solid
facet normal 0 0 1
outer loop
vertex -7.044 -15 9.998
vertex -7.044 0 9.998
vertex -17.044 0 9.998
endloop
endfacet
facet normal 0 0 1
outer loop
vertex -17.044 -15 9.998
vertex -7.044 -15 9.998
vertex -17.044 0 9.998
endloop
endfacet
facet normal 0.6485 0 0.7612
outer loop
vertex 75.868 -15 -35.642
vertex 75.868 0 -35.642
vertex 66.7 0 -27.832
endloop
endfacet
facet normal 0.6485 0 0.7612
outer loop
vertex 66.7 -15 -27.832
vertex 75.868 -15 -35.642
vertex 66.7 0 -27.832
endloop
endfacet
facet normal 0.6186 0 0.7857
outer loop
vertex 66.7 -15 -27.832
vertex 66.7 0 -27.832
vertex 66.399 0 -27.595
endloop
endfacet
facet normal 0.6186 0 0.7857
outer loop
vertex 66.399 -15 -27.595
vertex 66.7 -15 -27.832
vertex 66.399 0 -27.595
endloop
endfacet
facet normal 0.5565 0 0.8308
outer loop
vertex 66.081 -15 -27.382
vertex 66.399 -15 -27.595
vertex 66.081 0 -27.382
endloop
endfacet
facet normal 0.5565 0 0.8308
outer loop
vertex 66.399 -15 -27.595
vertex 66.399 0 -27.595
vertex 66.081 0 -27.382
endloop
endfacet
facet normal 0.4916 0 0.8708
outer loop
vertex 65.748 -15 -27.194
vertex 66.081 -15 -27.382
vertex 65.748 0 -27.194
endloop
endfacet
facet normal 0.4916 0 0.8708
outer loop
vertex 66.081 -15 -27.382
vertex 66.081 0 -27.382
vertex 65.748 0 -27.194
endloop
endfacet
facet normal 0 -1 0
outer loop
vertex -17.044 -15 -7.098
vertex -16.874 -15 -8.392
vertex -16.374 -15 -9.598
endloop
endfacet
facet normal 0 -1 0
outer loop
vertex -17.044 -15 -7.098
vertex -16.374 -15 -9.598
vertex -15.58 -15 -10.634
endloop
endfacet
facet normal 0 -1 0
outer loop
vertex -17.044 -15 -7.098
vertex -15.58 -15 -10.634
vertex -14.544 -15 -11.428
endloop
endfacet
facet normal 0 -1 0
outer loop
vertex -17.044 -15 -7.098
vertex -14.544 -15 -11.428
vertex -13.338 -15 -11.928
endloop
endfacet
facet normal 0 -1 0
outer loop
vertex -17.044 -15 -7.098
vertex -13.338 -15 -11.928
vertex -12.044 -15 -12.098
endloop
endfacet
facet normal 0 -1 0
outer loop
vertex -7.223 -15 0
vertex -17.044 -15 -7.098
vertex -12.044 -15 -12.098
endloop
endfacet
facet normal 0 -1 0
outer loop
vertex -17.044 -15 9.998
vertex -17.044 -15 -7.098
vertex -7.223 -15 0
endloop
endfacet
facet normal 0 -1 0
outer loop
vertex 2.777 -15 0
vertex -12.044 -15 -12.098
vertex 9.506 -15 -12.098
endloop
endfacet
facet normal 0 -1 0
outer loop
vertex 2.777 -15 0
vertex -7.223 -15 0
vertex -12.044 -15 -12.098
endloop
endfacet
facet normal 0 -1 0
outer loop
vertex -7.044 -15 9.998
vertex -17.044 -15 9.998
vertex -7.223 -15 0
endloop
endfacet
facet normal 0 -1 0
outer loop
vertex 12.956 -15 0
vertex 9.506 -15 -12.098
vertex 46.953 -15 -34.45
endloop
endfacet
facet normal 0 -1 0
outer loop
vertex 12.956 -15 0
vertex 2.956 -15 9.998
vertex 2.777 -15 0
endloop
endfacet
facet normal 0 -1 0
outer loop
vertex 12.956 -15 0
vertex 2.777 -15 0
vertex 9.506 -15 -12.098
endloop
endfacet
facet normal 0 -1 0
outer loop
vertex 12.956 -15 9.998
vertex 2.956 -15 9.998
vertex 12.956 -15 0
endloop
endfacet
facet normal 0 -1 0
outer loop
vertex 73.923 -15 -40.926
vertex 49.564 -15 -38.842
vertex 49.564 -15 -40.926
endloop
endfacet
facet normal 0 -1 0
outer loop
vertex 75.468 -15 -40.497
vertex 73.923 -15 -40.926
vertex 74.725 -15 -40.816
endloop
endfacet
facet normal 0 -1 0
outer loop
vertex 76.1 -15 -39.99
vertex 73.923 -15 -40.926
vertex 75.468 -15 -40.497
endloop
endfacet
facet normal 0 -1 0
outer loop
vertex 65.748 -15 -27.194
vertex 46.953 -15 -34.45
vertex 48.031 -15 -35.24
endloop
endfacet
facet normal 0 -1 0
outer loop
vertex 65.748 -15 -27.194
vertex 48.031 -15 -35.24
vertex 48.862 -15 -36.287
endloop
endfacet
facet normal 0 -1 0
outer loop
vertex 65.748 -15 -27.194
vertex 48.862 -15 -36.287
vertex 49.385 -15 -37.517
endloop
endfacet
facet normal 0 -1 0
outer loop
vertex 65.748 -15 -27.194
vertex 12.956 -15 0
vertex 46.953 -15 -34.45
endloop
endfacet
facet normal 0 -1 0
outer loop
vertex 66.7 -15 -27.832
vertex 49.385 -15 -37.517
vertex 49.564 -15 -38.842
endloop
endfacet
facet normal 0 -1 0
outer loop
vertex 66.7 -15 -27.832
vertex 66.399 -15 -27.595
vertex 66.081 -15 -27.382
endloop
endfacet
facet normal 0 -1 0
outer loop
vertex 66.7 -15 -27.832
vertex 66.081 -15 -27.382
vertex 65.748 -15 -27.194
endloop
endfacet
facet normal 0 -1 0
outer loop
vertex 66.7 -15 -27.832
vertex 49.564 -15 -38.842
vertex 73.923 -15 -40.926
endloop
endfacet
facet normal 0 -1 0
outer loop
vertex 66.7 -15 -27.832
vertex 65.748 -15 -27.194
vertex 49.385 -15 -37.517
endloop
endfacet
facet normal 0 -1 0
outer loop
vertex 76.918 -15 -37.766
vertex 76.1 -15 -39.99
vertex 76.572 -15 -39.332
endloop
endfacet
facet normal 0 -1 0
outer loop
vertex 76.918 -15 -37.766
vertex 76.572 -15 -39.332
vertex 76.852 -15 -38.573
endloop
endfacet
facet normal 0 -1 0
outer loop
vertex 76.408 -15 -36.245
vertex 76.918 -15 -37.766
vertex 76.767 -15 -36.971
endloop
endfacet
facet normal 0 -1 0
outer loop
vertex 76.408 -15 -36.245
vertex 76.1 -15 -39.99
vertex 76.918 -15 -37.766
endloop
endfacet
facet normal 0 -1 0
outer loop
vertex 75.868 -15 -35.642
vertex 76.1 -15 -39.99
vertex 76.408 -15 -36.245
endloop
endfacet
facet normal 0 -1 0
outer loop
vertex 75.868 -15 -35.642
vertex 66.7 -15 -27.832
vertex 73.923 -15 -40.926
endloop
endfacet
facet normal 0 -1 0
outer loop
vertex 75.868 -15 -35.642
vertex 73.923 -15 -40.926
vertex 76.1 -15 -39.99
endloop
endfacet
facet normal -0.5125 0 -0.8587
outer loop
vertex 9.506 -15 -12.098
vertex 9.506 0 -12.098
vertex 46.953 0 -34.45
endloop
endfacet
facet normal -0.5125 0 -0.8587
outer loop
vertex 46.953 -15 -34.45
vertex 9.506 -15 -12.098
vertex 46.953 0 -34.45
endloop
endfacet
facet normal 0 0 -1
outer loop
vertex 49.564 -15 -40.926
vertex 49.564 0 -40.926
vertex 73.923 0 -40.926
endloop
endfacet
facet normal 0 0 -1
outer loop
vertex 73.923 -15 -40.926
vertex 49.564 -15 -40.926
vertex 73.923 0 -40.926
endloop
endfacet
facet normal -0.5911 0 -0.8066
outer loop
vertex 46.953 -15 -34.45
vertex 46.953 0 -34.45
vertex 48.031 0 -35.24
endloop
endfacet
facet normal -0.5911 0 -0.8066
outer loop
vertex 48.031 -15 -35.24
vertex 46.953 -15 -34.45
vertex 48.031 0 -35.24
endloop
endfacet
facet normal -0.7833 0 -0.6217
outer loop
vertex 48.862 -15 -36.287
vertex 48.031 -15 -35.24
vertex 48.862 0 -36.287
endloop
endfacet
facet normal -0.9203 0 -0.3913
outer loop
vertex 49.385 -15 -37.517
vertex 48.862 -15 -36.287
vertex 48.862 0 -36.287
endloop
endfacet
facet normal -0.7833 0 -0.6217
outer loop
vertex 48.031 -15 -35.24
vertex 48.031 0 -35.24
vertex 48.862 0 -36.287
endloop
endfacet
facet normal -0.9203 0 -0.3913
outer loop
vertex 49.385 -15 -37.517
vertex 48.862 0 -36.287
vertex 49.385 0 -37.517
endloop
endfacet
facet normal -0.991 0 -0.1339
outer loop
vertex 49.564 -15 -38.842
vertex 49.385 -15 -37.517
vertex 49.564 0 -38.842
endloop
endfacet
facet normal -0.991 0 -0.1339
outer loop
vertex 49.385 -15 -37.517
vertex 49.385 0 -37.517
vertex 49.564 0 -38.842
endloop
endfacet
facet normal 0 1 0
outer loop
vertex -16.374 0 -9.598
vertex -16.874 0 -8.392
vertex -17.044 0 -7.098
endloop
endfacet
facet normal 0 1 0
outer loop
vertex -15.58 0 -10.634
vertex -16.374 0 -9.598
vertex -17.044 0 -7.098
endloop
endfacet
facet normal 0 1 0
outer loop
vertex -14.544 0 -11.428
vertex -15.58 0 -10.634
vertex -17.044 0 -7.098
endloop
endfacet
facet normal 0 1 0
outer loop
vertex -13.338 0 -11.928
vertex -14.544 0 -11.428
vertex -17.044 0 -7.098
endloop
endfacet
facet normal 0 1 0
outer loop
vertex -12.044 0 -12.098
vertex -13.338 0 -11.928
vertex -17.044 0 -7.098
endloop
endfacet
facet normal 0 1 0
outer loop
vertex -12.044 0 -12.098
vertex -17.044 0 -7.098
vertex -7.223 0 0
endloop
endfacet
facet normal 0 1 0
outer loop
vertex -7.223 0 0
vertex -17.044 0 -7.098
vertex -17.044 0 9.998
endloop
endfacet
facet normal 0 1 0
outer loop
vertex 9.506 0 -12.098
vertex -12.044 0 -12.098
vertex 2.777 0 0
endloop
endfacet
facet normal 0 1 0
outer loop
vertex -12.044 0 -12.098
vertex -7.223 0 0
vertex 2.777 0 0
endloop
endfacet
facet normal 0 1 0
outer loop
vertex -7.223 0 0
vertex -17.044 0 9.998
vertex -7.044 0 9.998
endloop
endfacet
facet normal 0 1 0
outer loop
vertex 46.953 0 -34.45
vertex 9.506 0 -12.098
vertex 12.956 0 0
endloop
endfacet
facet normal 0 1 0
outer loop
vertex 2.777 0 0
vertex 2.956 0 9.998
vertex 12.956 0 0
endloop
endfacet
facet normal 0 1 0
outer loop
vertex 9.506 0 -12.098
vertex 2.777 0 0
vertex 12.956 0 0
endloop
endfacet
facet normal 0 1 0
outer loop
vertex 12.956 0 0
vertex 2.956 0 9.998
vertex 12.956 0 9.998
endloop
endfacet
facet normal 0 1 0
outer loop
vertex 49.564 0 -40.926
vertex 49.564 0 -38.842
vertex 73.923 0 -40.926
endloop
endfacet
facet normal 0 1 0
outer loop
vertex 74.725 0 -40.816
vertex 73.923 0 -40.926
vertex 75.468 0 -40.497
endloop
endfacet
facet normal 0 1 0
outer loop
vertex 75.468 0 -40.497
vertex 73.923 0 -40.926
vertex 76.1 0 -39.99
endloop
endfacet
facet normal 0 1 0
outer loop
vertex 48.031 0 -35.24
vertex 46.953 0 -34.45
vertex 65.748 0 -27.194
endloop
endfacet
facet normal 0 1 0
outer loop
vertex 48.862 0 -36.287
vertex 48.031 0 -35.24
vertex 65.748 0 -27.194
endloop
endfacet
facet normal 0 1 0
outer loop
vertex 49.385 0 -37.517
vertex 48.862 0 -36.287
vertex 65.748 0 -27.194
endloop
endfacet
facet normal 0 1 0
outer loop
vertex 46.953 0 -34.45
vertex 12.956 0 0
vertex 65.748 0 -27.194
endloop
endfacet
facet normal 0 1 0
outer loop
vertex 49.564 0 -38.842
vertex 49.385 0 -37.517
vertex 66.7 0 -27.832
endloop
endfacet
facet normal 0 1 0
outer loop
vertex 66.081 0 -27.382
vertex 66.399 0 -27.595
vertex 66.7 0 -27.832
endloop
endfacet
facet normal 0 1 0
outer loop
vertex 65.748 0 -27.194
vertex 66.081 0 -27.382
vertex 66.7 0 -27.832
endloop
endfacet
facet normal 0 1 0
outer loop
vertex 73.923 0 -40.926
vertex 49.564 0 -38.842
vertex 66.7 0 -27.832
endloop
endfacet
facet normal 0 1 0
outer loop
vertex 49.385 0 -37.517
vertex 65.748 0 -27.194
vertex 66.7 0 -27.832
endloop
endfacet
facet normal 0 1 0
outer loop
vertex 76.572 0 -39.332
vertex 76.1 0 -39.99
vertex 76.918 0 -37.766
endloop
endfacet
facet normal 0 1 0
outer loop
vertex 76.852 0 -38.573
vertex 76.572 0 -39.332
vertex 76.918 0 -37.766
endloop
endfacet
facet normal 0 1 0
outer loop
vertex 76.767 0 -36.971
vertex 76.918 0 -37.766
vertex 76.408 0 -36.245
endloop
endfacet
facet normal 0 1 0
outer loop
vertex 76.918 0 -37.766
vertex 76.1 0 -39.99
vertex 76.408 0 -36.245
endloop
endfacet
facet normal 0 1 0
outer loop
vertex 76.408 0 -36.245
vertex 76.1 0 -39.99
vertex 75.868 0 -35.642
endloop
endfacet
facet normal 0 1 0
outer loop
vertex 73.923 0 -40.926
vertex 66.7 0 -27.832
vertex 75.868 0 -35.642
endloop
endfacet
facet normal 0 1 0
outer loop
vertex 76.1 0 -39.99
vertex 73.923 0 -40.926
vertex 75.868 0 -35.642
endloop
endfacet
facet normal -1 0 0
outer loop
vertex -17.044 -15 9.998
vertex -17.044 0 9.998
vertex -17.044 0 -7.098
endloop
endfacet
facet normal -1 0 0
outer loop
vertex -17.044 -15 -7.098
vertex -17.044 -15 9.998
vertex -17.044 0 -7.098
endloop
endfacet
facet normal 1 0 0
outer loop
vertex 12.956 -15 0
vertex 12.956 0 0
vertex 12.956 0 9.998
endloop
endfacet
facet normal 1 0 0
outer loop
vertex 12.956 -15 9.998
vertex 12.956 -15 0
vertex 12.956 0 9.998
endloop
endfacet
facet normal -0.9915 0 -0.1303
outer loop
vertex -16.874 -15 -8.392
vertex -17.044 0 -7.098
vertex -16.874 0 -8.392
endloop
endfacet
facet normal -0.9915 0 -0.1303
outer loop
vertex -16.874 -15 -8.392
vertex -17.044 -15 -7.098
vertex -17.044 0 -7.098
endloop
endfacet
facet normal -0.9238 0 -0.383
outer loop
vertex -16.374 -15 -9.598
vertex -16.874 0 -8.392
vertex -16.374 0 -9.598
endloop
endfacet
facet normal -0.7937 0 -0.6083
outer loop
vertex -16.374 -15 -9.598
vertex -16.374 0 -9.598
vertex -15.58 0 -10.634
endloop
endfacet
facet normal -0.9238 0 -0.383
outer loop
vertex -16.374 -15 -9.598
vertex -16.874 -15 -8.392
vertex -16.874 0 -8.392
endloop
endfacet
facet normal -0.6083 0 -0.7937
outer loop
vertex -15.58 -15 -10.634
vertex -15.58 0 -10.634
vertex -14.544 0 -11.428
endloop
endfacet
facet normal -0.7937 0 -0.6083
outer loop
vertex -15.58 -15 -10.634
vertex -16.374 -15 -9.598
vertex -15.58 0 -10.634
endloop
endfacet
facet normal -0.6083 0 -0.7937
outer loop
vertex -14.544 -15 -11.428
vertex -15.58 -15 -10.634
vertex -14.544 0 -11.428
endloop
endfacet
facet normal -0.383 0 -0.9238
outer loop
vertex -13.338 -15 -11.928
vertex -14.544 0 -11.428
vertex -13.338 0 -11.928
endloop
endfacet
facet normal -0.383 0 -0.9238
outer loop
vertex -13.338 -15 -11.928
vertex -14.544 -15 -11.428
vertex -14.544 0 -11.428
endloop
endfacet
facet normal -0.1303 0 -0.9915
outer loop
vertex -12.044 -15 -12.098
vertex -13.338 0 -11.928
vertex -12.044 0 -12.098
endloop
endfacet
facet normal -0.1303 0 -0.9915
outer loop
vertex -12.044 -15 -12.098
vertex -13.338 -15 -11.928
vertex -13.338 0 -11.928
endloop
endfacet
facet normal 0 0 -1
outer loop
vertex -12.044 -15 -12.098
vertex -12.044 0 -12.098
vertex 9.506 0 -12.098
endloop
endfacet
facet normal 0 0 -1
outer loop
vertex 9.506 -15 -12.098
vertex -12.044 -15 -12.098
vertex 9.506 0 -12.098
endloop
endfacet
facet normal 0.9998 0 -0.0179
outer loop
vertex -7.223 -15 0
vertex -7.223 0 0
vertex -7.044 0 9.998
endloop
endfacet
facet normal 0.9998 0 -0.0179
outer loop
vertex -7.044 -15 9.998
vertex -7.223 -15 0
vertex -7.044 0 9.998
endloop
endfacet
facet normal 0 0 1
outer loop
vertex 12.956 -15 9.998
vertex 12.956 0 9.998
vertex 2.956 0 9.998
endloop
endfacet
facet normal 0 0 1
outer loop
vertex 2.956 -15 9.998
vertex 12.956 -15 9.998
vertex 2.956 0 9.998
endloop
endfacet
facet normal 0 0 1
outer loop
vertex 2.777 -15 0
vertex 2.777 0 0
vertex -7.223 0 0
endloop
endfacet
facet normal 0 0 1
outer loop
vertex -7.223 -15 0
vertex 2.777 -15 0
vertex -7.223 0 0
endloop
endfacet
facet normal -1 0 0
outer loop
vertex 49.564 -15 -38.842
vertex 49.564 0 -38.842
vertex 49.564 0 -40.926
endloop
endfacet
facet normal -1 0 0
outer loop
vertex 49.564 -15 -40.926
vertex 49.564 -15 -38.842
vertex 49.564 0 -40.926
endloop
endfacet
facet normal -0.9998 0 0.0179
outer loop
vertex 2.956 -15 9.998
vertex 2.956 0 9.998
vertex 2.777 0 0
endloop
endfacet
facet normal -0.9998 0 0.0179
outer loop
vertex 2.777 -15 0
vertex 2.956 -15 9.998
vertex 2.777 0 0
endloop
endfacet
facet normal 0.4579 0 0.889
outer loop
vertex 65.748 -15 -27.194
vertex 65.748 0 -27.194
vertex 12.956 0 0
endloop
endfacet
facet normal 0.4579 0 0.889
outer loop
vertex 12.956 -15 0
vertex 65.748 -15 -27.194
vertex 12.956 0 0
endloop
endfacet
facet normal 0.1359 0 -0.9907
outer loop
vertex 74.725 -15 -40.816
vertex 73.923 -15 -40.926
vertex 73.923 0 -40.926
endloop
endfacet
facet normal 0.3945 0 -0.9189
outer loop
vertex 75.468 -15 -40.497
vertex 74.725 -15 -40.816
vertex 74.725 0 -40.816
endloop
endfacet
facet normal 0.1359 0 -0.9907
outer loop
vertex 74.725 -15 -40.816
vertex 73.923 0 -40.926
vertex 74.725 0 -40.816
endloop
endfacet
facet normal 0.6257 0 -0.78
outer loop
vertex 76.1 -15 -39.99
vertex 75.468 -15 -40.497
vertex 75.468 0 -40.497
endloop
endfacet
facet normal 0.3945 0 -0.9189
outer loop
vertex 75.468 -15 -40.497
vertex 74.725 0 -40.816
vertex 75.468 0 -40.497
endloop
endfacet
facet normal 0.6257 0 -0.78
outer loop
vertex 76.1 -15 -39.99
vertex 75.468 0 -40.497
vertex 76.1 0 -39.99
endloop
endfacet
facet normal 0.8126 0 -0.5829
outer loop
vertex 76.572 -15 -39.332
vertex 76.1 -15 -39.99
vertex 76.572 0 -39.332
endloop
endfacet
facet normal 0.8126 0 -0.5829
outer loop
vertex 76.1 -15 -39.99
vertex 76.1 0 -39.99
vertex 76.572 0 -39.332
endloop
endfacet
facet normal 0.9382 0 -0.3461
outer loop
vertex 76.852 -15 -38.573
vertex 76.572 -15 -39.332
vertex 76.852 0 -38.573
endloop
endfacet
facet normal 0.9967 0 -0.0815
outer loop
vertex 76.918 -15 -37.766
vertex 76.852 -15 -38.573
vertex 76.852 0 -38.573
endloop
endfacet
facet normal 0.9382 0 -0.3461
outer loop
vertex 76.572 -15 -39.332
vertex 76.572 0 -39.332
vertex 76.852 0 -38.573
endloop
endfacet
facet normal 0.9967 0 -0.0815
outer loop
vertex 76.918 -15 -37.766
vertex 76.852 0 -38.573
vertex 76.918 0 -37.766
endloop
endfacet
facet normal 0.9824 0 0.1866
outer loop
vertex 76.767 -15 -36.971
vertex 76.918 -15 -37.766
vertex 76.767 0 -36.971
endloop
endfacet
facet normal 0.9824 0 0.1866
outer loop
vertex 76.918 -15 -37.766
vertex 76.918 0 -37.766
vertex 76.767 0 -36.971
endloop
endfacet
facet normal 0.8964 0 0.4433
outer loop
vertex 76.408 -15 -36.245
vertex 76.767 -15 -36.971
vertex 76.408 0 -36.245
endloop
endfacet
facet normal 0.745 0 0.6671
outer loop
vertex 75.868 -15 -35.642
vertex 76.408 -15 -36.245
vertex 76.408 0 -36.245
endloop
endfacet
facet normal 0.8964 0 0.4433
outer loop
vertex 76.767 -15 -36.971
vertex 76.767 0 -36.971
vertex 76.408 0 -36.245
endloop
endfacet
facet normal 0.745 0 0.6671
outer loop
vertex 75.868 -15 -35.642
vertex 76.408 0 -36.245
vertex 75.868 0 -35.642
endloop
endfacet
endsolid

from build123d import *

# Parameters (mm, degrees)
F1_DEPTH = 15
F2_R     = 5


with BuildPart() as f1:
    # F0 (on Front) → F1 (new body)
    with BuildSketch(Plane.XZ):
        with BuildLine():
            Line((65.747503, -27.193502), (12.955731, 0))
            Line((12.955731, 0), (12.955731, 9.998409))
            Line((12.955731, 9.998409), (2.955731, 9.998409))
            Line((2.955731, 9.998409), (2.777357, 0))
            Line((2.777357, 0), (-7.222643, 0))
            Line((-7.222643, 0), (-7.044269, 9.998409))
            Line((-7.044269, 9.998409), (-17.044269, 9.998409))
            Line((-17.044269, 9.998409), (-17.044269, 0))
            Line((-17.044269, 0), (-17.044269, -12.098167))
            Line((-17.044269, -12.098167), (9.505874, -12.098167))
            Line((9.505874, -12.098167), (46.953158, -34.44976))
            ThreePointArc((46.953158, -34.44976), (48.861942, -36.287192), (49.563903, -38.841965))
            Line((49.563903, -38.841965), (49.563903, -40.925505))
            Line((49.563903, -40.925505), (73.922526, -40.925505))
            ThreePointArc((73.922526, -40.925505), (76.737769, -38.962041), (75.867925, -35.641776))
            Line((75.867925, -35.641776), (66.700202, -27.832236))
            ThreePointArc((66.700202, -27.832236), (66.242229, -27.48546), (65.747503, -27.193502))
        make_face()
    extrude(amount=F1_DEPTH)

    # F2
    f2_edges = [f1.edges().sort_by_distance(p)[0] for p in [
        (-17.044269, -7.5, -12.098167),
    ]]
    fillet(f2_edges, radius=F2_R)


solid = f1.part
